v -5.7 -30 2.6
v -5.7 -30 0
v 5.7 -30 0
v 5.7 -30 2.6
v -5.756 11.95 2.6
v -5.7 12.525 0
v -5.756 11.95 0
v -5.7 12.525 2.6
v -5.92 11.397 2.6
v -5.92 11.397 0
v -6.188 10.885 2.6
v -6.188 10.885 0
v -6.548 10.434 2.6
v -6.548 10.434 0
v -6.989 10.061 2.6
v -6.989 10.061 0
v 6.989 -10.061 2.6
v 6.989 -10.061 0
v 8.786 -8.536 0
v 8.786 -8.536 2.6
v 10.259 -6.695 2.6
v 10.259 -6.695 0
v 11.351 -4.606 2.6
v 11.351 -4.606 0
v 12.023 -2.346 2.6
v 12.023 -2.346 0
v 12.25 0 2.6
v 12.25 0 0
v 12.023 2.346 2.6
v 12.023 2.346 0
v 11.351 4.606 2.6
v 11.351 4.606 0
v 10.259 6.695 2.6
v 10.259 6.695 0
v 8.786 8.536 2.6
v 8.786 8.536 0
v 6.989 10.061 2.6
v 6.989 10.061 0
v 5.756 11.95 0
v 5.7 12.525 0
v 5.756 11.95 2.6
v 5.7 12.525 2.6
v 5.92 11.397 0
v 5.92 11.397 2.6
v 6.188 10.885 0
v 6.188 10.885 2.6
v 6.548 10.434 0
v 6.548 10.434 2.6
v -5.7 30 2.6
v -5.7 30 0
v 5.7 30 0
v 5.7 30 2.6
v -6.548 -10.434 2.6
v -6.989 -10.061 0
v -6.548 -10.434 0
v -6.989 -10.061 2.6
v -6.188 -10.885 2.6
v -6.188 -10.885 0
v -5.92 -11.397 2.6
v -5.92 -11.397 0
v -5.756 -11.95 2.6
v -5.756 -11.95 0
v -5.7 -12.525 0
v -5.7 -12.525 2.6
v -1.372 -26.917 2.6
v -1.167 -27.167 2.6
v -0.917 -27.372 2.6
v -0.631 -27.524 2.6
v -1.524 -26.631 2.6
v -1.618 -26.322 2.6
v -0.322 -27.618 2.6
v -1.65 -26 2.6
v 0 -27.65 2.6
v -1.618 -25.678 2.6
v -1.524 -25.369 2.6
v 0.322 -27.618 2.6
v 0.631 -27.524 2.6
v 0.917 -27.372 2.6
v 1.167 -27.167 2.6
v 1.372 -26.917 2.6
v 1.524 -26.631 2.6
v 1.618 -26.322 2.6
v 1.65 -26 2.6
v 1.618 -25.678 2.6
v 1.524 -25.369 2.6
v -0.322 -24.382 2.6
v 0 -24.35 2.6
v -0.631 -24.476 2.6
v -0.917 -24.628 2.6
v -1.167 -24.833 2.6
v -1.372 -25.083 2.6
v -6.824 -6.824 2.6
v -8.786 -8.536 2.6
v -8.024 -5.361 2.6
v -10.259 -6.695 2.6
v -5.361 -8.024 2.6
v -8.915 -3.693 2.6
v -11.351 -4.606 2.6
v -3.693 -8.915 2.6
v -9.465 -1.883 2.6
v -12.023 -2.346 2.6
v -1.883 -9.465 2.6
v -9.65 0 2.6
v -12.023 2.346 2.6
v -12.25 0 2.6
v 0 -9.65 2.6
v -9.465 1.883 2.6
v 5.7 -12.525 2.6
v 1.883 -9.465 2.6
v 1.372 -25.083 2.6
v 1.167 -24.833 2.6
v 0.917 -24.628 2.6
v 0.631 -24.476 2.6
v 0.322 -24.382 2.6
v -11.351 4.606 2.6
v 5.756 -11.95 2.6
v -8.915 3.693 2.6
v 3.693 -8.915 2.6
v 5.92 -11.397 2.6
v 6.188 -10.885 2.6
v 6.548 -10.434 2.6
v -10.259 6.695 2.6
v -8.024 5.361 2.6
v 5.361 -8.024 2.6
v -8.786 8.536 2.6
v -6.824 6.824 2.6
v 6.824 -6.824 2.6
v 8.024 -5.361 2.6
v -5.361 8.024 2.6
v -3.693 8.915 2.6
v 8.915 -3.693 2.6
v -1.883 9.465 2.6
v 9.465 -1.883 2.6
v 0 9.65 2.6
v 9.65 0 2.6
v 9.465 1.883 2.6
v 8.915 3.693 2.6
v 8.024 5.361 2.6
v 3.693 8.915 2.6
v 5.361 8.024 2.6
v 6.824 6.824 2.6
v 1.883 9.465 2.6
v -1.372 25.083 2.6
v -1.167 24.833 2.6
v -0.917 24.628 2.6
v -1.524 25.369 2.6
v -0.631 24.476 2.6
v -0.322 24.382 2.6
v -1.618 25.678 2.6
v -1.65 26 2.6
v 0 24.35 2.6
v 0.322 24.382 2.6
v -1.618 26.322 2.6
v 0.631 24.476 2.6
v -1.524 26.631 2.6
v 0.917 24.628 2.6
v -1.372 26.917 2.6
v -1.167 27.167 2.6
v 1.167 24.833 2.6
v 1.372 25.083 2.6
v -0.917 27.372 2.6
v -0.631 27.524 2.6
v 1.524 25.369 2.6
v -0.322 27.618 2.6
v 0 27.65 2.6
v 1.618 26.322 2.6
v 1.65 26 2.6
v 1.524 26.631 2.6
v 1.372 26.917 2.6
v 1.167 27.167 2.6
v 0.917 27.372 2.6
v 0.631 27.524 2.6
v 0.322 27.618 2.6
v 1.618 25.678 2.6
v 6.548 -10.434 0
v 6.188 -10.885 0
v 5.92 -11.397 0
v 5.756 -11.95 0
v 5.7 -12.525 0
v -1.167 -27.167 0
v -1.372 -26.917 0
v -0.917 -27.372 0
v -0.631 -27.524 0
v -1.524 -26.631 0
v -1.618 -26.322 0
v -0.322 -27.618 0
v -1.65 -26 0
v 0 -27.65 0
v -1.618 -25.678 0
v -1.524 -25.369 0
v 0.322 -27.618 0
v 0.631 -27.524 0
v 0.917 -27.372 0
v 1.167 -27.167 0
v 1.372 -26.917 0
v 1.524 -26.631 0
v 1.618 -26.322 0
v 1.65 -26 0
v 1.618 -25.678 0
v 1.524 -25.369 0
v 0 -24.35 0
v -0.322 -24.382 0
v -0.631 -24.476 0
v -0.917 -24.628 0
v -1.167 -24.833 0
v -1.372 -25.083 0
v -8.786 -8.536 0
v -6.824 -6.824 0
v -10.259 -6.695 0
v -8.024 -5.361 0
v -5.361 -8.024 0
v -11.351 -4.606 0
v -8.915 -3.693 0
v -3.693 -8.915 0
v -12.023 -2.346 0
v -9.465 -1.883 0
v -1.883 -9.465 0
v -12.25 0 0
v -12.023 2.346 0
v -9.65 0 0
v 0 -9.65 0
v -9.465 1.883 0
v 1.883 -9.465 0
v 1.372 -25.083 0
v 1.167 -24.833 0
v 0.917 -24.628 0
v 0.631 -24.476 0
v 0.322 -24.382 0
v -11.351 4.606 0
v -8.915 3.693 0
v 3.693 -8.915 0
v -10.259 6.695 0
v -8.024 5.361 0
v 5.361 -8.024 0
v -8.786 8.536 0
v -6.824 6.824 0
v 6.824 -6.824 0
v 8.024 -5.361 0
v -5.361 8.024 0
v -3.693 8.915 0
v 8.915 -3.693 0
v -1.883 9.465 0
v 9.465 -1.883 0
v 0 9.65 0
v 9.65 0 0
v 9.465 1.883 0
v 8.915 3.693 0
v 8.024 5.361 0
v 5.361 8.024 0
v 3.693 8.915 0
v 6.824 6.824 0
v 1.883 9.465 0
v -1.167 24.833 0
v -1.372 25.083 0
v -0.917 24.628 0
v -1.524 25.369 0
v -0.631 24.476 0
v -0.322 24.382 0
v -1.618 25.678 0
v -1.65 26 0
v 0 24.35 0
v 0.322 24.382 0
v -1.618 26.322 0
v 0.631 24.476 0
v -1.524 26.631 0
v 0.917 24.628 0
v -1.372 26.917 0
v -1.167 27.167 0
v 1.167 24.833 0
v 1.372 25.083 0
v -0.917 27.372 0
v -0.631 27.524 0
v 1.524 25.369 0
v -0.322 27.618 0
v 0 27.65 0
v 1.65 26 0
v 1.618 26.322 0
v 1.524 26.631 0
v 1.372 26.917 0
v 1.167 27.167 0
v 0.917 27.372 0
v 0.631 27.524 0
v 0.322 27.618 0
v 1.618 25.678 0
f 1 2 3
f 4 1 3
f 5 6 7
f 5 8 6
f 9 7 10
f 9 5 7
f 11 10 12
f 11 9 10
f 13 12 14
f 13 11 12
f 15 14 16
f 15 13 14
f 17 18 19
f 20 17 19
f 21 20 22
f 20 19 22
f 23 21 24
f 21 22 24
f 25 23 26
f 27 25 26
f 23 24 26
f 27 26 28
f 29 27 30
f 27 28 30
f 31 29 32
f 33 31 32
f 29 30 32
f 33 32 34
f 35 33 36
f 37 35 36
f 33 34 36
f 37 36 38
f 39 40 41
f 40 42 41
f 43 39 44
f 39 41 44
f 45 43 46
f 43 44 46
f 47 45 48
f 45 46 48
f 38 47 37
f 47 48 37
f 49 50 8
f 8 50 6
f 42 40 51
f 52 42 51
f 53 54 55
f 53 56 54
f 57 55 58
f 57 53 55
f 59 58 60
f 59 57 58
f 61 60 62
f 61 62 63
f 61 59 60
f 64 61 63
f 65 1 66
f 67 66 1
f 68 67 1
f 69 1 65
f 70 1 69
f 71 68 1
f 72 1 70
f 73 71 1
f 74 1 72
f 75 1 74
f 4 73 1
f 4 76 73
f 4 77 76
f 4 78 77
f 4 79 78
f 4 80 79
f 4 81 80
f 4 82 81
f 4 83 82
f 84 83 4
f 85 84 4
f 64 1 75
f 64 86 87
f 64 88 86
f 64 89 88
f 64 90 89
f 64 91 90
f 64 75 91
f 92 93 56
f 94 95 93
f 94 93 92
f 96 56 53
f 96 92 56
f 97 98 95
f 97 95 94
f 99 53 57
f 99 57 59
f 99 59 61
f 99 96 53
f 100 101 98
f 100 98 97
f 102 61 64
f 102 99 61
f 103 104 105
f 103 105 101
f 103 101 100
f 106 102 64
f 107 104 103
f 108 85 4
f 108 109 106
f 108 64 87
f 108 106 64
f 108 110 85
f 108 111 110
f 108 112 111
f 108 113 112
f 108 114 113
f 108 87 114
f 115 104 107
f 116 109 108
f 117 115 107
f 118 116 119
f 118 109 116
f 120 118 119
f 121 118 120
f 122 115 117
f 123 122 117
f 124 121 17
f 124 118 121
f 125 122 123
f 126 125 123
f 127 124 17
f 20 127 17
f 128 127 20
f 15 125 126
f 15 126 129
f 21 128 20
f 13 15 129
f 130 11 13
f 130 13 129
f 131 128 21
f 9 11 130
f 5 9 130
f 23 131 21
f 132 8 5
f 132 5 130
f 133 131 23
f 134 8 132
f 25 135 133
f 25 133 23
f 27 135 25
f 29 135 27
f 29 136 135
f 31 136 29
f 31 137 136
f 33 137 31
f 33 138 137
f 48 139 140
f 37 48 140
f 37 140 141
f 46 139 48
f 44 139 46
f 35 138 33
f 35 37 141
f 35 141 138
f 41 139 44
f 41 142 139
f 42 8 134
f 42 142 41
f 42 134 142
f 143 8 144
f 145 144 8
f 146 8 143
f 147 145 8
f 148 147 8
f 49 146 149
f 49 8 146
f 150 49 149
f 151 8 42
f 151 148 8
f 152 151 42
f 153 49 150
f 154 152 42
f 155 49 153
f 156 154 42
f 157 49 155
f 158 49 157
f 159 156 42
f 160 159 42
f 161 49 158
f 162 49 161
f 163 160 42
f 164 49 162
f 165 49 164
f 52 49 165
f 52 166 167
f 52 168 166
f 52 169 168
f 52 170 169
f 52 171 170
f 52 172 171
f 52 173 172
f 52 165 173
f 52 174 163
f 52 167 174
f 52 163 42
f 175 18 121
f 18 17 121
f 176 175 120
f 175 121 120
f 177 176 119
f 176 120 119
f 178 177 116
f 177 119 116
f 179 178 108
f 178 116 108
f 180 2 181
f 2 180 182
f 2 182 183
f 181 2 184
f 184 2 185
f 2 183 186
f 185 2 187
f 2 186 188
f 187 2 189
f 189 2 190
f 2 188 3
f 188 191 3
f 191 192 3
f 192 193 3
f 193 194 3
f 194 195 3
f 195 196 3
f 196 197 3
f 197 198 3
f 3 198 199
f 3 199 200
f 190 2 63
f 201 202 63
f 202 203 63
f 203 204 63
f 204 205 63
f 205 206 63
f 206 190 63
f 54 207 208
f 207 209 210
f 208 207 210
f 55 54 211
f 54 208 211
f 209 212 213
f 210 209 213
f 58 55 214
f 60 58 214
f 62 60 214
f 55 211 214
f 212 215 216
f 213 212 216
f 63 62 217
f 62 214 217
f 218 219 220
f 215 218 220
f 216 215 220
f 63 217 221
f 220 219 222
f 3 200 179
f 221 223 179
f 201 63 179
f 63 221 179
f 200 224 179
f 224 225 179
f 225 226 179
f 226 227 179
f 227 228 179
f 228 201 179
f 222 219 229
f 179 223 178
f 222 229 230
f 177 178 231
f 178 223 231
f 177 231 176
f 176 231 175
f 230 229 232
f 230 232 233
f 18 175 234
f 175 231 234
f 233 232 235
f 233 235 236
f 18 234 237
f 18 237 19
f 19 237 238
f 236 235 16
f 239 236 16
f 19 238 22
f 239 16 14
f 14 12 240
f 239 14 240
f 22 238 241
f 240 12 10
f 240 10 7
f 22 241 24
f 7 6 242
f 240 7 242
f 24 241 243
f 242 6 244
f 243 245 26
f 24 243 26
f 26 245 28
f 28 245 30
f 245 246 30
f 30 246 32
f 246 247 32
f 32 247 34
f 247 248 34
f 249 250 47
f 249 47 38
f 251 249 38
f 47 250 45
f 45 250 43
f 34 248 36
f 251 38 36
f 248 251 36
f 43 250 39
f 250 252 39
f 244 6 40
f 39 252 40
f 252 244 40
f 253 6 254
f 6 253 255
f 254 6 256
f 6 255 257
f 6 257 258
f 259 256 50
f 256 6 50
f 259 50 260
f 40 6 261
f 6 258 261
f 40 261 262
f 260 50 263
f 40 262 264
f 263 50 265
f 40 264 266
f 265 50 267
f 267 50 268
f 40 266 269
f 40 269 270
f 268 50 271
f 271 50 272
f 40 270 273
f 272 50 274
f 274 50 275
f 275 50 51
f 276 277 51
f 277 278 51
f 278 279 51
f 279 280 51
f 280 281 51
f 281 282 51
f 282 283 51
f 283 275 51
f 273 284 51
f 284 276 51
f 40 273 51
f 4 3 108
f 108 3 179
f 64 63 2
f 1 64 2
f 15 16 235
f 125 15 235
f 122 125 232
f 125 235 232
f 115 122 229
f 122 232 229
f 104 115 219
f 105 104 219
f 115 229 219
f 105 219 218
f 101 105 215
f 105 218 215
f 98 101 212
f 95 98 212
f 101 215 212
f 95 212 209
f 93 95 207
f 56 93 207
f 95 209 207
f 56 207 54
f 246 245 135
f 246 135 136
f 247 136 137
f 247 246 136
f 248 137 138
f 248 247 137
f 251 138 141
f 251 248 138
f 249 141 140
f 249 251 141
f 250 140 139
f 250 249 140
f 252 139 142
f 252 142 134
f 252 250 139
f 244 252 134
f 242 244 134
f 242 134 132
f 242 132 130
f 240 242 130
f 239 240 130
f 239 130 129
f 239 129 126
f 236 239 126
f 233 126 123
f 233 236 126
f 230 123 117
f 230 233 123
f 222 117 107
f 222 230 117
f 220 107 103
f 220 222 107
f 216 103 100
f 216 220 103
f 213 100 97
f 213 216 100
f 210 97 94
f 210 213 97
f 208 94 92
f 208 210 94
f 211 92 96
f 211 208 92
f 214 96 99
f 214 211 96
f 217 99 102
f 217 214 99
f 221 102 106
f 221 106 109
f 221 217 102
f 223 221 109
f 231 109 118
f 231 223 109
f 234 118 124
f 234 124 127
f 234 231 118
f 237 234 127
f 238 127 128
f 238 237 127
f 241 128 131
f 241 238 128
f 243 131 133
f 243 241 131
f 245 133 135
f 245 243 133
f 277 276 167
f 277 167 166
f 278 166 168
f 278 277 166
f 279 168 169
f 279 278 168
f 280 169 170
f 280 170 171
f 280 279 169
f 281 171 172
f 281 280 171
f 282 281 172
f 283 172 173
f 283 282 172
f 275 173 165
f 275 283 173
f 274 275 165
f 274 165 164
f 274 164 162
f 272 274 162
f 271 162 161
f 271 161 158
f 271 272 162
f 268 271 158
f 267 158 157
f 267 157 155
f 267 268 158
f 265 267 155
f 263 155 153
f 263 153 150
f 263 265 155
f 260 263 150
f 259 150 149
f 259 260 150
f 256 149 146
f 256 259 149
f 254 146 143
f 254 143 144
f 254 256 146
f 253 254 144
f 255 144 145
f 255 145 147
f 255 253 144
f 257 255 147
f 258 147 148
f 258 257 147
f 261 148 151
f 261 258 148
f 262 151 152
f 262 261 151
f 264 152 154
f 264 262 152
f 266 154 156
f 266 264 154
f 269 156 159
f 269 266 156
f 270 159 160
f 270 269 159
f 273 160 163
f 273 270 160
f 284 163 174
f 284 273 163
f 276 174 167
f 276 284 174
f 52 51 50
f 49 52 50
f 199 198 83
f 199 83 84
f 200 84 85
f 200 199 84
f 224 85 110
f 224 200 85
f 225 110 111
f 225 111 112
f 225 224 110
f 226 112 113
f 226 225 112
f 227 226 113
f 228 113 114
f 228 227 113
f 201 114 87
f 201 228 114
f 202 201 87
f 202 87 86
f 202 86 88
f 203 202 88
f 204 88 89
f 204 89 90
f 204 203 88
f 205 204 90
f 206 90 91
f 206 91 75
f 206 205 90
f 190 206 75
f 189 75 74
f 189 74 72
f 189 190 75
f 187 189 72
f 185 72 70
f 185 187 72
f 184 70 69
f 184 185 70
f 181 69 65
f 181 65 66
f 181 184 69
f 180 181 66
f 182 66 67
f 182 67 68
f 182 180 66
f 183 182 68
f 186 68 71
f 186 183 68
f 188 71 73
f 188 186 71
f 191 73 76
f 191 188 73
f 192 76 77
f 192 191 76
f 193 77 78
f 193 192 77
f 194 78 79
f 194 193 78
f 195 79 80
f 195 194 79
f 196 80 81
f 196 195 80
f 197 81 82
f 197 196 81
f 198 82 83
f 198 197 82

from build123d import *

# Parameters (mm, degrees)
SKETCH_1_R      = 9.65
SKETCH_1_R_2    = 1.65
EXTRUDE_1_DEPTH = 2.6
FILLET_1_R      = 3


with BuildPart() as part:
    # 草图1 → 凸台-拉伸1 (new body)
    with BuildSketch(Plane.XY):
        with BuildLine():
            Line((0, 30), (-5.7, 30))
            Line((-5.7, 30), (-5.7, 10.843085354))
            ThreePointArc((-5.7, 10.843085354), (-12.25, 0), (-5.7, -10.843085354))
            Line((-5.7, -10.843085354), (-5.7, -30))
            Line((-5.7, -30), (0, -30))
            Line((0, -30), (5.7, -30))
            Line((5.7, -30), (5.7, -10.843085354))
            ThreePointArc((5.7, -10.843085354), (12.25, 0), (5.7, 10.843085354))
            Line((5.7, 10.843085354), (5.7, 30))
            Line((5.7, 30), (0, 30))
        make_face()
        Circle(SKETCH_1_R, mode=Mode.SUBTRACT)
        with Locations((0, 26)):
            Circle(SKETCH_1_R_2, mode=Mode.SUBTRACT)
        with Locations((0, -26)):
            Circle(SKETCH_1_R_2, mode=Mode.SUBTRACT)
    extrude(amount=EXTRUDE_1_DEPTH)

    # 圆角1
    fillet_1_edges = [part.edges().sort_by_distance(p)[0] for p in [
        (5.7, -10.843085354, 1.3),
        (-5.7, -10.843085354, 1.3),
        (-5.7, 10.843085354, 1.3),
        (5.7, 10.843085354, 1.3),
    ]]
    fillet(fillet_1_edges, radius=FILLET_1_R)


solid = part.part
